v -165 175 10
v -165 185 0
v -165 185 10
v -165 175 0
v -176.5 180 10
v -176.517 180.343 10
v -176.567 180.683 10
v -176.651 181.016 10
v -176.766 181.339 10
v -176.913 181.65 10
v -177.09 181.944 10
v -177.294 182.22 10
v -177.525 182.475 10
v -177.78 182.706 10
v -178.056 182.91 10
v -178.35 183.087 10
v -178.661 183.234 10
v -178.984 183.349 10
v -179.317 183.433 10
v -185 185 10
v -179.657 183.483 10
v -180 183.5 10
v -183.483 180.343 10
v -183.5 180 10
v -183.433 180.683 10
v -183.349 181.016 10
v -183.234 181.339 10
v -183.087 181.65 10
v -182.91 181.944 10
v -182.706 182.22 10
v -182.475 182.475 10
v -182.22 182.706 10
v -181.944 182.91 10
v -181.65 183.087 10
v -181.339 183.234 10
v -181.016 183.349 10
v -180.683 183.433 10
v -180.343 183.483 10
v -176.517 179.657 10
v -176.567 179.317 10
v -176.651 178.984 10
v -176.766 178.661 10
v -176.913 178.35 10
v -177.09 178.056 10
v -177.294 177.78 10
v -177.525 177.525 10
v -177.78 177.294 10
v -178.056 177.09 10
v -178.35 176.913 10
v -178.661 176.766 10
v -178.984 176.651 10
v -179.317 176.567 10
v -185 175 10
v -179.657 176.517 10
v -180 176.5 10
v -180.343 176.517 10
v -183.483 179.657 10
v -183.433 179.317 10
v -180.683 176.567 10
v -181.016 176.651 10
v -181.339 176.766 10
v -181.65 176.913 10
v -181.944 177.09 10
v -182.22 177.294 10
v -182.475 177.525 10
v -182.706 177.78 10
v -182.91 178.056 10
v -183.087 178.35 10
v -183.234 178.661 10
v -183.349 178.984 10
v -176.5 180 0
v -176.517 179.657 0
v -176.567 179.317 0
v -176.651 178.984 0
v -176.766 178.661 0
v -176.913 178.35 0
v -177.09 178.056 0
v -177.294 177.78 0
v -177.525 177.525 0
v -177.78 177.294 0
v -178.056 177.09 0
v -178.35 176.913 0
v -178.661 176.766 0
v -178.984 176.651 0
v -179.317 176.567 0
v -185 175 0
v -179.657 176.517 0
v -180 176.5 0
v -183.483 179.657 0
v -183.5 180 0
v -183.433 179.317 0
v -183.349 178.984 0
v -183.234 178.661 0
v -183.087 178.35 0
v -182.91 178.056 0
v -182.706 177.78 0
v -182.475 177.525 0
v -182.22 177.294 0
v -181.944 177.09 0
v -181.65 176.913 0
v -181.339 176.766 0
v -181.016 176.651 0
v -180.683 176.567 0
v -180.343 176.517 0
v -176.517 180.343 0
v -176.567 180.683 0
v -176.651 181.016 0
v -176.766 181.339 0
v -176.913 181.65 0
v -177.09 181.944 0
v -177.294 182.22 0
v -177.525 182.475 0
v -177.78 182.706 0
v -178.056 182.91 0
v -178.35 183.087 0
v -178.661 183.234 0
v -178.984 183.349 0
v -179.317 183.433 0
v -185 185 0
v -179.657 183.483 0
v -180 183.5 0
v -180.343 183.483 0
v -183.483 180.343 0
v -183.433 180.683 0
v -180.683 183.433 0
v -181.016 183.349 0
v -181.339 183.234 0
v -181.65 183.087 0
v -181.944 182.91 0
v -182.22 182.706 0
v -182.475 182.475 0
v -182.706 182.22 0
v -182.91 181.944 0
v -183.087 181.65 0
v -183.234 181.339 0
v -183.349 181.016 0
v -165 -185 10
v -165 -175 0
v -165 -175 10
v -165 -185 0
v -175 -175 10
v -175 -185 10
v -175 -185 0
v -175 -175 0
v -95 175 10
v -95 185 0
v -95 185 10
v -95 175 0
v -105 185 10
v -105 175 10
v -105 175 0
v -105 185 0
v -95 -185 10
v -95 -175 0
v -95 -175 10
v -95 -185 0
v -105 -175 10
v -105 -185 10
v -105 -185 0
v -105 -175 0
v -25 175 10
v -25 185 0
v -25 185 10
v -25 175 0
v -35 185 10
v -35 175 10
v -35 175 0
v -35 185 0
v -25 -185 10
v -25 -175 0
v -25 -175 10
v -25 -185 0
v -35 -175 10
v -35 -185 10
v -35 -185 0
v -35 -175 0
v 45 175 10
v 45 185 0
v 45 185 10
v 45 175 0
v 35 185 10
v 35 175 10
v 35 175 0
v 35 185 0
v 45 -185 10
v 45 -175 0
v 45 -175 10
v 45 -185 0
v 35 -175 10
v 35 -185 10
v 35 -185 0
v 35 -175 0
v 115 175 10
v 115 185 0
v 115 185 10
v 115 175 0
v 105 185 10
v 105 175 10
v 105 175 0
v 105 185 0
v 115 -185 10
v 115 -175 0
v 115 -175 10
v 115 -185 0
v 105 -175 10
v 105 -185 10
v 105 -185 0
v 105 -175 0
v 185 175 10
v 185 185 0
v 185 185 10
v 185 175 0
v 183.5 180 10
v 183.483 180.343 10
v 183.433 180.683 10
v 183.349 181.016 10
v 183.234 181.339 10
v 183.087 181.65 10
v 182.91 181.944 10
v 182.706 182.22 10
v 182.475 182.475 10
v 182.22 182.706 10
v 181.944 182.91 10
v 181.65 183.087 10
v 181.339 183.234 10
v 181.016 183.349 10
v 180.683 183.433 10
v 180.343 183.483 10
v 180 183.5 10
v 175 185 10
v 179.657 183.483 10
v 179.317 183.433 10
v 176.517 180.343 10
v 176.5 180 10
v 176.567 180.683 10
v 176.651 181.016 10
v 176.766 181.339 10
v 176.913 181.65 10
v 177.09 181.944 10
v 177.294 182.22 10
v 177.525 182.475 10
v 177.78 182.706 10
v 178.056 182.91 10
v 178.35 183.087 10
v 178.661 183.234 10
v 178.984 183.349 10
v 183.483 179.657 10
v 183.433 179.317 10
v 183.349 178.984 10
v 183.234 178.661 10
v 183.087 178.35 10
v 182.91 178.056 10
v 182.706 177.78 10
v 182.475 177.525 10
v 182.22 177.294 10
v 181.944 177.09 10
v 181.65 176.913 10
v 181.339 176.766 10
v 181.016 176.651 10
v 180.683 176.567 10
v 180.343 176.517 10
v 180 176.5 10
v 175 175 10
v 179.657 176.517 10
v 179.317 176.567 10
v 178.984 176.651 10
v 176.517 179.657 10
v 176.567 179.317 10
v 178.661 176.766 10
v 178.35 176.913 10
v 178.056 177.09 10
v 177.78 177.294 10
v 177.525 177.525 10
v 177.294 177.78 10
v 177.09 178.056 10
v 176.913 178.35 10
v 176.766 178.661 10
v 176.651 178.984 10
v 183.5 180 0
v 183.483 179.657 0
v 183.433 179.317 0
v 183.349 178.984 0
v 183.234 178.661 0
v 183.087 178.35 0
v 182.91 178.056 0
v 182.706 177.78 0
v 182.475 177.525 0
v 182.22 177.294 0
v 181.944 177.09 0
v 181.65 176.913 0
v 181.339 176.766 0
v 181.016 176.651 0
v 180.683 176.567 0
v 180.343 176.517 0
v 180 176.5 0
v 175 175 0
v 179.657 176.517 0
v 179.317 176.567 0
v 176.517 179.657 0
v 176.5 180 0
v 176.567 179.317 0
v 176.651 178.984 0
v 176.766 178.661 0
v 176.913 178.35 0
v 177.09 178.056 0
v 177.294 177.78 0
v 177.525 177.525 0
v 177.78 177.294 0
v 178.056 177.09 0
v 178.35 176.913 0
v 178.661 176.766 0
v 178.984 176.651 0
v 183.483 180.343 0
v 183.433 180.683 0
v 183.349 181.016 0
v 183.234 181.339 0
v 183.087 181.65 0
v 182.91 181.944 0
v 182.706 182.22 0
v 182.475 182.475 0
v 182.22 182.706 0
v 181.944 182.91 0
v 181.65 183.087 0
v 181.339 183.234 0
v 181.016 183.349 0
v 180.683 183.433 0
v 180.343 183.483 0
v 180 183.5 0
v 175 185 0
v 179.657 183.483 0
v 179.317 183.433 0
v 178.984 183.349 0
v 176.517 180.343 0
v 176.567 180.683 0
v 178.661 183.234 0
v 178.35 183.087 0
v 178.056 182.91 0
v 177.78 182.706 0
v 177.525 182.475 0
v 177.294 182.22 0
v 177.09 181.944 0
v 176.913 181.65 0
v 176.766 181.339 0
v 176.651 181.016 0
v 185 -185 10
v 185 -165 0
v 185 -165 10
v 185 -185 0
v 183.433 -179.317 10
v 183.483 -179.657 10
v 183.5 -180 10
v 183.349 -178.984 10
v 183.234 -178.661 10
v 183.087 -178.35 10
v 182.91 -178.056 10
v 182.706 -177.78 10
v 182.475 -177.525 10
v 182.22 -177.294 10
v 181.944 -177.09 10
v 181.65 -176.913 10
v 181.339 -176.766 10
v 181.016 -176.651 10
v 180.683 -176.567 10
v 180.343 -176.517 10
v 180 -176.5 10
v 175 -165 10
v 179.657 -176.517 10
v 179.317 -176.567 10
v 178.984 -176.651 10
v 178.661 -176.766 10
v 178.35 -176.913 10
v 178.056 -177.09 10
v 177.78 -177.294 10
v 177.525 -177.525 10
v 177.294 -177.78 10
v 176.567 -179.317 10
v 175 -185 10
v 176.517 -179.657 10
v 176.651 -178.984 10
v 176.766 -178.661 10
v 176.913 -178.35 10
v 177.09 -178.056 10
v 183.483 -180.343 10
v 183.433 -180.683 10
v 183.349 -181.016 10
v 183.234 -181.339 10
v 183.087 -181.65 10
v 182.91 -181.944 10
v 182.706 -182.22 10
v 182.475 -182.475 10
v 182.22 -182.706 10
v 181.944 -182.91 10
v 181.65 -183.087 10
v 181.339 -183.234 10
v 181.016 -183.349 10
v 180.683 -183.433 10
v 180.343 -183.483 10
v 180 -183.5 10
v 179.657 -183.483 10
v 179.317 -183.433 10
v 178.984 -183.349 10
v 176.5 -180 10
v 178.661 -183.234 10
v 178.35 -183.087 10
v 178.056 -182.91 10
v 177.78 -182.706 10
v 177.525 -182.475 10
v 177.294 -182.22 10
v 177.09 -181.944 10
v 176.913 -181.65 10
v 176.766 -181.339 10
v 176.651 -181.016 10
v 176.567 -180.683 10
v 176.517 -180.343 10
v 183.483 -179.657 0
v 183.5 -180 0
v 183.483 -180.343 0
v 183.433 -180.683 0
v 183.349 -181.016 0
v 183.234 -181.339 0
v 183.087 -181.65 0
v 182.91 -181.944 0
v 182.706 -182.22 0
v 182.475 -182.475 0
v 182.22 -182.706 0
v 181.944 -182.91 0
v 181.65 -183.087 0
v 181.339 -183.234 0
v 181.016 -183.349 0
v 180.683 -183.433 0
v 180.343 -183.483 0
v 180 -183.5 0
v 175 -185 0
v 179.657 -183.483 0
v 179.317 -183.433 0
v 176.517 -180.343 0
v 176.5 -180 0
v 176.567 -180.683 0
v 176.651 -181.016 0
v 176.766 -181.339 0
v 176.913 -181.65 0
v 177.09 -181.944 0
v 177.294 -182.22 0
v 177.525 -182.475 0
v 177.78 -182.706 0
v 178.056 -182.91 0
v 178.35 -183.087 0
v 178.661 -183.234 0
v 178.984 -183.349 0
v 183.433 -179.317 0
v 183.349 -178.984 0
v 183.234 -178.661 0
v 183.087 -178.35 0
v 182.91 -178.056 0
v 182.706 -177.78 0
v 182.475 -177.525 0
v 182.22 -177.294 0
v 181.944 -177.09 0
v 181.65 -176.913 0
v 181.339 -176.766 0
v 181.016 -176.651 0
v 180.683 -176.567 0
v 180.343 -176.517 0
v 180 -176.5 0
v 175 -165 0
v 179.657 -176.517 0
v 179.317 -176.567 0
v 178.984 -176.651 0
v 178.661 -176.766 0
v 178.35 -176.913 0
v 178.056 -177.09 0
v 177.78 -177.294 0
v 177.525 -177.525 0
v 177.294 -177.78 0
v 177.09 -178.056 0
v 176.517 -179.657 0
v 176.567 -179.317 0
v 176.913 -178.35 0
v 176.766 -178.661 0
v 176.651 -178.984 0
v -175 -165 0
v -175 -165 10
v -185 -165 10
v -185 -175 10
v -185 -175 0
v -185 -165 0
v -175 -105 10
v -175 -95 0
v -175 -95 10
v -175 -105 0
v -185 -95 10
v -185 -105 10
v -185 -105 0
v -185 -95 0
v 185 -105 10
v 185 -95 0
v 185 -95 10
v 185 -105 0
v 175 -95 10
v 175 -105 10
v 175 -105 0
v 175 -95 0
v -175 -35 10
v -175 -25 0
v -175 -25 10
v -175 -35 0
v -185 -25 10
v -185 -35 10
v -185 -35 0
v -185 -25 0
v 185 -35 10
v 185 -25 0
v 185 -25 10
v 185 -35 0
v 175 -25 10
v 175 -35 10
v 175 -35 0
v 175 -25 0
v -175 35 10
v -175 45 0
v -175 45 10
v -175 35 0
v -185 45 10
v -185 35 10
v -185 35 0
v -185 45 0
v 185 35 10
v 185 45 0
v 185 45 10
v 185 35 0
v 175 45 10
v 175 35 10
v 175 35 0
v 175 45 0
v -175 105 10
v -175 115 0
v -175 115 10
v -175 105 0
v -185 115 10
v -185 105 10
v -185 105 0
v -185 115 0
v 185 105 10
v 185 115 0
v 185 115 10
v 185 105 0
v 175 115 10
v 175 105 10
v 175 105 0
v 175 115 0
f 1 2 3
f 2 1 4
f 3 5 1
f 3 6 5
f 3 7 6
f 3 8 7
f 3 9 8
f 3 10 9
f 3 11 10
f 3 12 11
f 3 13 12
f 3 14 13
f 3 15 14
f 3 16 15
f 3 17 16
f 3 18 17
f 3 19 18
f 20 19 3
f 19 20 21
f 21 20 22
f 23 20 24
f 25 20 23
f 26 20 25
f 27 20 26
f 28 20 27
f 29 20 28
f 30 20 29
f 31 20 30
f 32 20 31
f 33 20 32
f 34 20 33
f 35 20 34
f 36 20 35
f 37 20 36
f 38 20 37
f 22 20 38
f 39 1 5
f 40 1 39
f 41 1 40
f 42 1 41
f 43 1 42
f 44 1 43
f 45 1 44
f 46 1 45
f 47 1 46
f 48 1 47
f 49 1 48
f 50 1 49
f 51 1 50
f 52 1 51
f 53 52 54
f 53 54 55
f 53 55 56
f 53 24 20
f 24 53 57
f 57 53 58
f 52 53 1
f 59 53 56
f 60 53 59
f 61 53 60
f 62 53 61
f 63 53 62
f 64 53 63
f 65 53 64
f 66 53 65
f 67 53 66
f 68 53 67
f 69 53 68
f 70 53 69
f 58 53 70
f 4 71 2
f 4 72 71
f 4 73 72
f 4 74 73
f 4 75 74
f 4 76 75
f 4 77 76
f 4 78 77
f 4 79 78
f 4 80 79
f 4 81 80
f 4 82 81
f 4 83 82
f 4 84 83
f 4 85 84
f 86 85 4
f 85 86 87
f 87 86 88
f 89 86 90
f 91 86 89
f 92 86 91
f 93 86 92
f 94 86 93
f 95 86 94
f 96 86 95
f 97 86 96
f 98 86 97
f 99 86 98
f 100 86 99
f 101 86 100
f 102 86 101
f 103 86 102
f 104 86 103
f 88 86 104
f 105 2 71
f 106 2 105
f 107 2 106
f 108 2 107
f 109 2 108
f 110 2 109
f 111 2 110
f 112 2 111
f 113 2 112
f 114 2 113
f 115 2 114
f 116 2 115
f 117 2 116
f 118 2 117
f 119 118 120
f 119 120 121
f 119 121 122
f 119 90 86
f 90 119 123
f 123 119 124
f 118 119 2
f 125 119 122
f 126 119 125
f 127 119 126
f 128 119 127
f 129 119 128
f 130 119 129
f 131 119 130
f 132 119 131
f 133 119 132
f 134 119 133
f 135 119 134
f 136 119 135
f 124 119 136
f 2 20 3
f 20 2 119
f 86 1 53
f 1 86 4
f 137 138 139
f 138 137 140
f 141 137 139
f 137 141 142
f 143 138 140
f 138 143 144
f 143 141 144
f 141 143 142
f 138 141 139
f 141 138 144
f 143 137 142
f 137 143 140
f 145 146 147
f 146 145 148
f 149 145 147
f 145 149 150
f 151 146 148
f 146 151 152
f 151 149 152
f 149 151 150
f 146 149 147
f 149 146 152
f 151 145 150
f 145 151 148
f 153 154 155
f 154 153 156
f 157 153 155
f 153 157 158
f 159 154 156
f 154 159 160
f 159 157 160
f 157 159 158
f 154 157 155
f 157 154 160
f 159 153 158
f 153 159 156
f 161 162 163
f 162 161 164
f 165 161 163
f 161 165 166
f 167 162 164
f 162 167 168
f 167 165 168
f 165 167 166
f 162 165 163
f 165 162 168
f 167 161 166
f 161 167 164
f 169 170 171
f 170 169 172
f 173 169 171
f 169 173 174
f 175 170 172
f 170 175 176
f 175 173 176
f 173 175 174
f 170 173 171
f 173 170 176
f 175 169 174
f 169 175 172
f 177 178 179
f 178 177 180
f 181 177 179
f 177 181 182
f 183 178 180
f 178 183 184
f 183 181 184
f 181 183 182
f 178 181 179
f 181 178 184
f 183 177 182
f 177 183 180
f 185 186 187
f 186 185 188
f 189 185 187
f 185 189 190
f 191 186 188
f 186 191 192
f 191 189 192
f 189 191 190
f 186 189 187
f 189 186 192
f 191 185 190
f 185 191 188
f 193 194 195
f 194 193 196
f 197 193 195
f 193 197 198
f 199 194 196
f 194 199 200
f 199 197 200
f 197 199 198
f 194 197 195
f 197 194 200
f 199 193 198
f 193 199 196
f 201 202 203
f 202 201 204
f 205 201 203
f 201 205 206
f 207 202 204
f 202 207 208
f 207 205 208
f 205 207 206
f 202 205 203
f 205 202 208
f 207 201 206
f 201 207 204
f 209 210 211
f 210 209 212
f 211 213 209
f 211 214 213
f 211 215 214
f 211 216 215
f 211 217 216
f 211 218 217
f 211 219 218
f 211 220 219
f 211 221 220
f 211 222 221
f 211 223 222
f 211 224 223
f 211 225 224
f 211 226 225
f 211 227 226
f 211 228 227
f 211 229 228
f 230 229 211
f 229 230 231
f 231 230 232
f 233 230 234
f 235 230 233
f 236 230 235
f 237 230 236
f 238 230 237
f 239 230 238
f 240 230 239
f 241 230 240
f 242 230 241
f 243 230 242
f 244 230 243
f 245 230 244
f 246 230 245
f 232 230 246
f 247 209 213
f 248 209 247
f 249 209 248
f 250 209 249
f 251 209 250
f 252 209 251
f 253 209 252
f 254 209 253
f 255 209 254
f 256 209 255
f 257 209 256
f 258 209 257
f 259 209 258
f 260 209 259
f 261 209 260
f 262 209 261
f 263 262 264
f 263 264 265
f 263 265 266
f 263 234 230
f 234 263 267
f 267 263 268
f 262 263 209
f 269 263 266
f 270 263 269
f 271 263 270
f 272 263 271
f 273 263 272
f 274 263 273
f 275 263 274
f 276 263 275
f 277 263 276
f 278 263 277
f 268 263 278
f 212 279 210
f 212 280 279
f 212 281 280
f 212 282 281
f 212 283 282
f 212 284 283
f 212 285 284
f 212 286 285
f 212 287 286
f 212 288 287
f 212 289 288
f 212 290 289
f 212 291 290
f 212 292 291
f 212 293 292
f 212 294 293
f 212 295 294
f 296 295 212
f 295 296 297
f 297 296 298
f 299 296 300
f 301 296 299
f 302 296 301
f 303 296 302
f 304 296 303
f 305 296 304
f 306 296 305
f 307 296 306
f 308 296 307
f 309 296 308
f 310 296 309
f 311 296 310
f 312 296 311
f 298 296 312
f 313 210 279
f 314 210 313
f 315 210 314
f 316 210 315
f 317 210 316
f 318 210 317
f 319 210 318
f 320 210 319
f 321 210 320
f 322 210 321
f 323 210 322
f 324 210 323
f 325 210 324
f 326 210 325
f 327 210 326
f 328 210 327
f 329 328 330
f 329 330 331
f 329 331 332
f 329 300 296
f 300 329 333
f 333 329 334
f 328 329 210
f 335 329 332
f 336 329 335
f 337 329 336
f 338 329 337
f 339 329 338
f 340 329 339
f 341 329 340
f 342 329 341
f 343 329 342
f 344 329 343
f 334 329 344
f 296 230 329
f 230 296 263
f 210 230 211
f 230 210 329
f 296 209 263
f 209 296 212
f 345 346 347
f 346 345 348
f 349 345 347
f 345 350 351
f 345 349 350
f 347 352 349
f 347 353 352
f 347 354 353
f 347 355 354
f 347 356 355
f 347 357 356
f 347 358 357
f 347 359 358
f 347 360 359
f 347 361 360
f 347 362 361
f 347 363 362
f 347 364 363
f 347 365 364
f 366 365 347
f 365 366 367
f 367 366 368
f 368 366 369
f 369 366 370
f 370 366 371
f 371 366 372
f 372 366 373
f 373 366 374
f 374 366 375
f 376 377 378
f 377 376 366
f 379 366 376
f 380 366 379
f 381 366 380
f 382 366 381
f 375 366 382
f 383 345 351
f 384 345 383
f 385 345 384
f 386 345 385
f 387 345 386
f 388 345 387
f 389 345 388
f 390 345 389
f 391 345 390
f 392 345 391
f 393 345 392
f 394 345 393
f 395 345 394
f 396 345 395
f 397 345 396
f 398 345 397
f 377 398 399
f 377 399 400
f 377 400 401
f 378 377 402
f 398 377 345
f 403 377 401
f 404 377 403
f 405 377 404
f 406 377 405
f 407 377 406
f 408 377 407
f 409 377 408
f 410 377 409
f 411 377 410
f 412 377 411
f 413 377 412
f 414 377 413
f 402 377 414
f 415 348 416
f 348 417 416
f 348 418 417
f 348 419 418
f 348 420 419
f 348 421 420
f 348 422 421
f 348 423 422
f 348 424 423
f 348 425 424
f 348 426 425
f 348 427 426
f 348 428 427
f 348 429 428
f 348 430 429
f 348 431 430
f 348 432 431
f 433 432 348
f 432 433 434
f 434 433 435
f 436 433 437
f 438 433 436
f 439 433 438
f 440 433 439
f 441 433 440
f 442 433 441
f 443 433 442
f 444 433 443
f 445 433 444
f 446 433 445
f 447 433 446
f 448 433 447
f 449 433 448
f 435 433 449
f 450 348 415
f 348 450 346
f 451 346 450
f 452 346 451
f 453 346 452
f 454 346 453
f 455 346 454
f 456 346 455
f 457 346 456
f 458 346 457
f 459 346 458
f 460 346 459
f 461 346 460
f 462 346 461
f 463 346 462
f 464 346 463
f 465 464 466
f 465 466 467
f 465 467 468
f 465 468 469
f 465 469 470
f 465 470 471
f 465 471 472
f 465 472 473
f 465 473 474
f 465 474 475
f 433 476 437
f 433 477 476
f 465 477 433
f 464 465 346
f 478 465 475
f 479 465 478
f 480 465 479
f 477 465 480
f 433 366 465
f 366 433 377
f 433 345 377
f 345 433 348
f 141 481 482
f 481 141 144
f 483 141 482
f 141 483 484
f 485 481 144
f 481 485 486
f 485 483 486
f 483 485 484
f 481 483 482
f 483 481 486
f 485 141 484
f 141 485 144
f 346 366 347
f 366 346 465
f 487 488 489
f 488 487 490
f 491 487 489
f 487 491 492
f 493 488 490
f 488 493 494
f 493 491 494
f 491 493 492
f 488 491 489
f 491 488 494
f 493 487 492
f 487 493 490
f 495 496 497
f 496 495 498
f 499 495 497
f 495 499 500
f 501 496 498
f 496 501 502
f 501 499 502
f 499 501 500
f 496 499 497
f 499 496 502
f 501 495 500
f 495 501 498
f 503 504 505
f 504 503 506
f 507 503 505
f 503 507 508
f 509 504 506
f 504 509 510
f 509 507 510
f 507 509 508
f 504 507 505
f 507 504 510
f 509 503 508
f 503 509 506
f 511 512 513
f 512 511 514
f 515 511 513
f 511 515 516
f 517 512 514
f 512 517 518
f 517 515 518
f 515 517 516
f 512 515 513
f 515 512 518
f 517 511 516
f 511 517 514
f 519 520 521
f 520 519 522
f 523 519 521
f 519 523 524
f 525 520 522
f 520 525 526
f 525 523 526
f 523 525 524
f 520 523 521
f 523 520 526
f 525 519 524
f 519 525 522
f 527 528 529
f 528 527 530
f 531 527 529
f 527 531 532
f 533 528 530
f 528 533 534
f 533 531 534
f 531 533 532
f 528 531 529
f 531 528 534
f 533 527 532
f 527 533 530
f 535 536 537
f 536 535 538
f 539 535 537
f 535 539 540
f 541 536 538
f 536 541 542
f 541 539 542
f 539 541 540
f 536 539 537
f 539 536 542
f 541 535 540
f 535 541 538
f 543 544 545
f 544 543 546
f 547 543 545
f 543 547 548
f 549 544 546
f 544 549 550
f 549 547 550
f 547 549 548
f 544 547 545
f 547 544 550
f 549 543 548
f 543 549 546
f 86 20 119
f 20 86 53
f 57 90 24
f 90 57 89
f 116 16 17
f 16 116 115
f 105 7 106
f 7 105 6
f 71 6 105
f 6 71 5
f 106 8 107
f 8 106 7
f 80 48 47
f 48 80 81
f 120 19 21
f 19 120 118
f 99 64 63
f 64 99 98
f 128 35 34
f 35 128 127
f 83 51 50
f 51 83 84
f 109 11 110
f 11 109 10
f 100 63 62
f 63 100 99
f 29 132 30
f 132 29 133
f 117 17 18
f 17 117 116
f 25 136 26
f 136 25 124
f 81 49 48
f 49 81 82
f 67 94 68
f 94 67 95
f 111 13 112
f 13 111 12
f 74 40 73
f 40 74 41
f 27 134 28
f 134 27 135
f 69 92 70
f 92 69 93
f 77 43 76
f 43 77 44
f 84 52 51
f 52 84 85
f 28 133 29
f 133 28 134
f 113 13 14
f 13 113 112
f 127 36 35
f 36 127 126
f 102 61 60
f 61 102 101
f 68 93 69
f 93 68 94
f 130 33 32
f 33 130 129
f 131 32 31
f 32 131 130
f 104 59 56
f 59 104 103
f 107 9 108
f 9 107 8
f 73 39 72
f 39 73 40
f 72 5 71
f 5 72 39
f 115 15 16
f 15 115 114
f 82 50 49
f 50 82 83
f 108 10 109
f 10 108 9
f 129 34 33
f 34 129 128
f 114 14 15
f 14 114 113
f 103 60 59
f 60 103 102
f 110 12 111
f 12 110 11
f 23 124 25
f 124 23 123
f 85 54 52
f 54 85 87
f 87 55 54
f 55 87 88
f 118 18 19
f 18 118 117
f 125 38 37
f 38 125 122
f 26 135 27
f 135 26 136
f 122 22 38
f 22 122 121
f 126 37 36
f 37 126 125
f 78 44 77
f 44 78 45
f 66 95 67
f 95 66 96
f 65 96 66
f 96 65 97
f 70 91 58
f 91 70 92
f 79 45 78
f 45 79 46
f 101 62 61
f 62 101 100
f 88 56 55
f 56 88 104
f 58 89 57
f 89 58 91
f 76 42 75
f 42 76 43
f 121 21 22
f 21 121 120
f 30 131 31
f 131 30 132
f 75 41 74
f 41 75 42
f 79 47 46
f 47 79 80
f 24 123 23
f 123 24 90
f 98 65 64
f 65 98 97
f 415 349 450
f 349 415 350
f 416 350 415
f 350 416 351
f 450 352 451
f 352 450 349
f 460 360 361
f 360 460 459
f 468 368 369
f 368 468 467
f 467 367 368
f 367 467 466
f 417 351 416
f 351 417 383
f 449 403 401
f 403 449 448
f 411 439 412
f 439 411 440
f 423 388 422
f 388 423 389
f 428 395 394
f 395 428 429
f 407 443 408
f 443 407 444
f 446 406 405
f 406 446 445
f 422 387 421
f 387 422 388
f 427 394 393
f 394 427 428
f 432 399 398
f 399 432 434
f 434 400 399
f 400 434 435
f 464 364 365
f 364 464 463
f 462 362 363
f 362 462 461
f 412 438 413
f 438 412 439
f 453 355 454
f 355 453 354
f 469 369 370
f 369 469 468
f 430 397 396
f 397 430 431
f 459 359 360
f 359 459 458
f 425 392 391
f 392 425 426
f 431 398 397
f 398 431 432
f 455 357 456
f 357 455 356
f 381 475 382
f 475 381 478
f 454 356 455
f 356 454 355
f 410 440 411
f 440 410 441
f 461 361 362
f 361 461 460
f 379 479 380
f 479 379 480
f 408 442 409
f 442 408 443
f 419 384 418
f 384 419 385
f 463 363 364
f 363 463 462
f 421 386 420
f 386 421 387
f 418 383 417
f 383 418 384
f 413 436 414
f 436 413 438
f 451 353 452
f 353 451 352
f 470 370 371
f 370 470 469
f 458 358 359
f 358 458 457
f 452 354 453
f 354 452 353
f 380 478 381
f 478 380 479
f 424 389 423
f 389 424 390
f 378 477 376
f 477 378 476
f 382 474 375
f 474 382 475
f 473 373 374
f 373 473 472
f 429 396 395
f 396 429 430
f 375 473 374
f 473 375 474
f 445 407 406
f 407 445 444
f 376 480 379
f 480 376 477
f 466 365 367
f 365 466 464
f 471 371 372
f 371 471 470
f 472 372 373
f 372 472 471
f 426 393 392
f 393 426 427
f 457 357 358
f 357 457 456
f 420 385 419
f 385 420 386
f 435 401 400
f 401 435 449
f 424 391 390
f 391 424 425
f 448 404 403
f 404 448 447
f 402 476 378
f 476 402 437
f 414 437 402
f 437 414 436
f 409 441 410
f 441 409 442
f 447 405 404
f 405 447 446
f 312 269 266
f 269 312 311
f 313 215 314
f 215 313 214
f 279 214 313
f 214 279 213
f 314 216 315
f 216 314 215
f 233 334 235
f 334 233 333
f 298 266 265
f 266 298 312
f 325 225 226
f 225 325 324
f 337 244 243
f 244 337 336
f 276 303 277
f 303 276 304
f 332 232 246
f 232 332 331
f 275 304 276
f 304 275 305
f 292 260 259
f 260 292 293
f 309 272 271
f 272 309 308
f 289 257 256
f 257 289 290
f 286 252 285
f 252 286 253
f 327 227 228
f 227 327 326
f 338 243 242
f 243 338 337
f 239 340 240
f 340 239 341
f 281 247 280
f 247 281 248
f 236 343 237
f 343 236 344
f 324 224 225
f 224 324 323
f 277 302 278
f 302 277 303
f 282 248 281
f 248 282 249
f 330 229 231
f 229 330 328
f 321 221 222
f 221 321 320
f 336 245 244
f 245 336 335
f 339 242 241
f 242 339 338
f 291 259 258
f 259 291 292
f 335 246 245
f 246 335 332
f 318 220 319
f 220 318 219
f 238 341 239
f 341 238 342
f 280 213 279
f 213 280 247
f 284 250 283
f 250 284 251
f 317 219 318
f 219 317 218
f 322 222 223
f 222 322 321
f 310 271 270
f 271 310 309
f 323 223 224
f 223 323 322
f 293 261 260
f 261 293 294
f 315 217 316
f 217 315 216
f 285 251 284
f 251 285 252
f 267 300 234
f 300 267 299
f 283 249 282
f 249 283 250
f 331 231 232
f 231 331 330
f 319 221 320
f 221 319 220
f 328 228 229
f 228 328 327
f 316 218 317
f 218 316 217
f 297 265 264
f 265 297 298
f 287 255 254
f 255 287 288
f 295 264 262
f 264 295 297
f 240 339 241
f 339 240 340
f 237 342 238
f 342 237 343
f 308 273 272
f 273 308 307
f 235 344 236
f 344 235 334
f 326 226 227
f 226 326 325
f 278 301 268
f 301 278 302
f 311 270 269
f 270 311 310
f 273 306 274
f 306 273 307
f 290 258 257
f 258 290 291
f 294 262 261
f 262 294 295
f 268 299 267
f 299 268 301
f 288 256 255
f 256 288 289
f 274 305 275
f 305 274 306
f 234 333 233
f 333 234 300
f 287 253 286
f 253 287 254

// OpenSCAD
// ring_09.scad - ring index 9 (z bottom = 90 mm)
$fn = 64; bar = 10; half_b = bar/2; outer = 370; half_outer = outer/2;
front_y = 180; back_y = -180; left_x = -180; right_x = 180;
x_centers = [-170, -100, -30, 40, 110, 180];
z_centers = [5, 85, 155, 225, 295, 365, 435, 505, 575, 645, 715]; ring_z = 90;
module place_box(cx, cy, sx, sy) { translate([cx - sx/2, cy - sy/2, 0]) cube([sx, sy, bar]); }

difference() { union() {
    for (x = x_centers) { place_box(x, front_y, bar, bar); place_box(x, back_y, bar, bar); }
    for (y = x_centers) { place_box(left_x, y, bar, bar); place_box(right_x, y, bar, bar); }
    for (zc = z_centers) if ((zc - half_b < ring_z + bar) && (zc + half_b > ring_z)) {
        translate([-half_outer, front_y - half_b, 0]) cube([outer, bar, bar]);
        translate([-half_outer, back_y - half_b, 0])  cube([outer, bar, bar]);
        translate([left_x - half_b, -half_outer, 0])  cube([bar, outer, bar]);
        translate([right_x - half_b, -half_outer, 0]) cube([bar, outer, bar]);
    }
  }
  for (cx = [-180, 180]) for (cy = [-180, 180]) translate([cx, cy, 0]) cylinder(h = bar, r = 3.5, $fn = 64);
}
